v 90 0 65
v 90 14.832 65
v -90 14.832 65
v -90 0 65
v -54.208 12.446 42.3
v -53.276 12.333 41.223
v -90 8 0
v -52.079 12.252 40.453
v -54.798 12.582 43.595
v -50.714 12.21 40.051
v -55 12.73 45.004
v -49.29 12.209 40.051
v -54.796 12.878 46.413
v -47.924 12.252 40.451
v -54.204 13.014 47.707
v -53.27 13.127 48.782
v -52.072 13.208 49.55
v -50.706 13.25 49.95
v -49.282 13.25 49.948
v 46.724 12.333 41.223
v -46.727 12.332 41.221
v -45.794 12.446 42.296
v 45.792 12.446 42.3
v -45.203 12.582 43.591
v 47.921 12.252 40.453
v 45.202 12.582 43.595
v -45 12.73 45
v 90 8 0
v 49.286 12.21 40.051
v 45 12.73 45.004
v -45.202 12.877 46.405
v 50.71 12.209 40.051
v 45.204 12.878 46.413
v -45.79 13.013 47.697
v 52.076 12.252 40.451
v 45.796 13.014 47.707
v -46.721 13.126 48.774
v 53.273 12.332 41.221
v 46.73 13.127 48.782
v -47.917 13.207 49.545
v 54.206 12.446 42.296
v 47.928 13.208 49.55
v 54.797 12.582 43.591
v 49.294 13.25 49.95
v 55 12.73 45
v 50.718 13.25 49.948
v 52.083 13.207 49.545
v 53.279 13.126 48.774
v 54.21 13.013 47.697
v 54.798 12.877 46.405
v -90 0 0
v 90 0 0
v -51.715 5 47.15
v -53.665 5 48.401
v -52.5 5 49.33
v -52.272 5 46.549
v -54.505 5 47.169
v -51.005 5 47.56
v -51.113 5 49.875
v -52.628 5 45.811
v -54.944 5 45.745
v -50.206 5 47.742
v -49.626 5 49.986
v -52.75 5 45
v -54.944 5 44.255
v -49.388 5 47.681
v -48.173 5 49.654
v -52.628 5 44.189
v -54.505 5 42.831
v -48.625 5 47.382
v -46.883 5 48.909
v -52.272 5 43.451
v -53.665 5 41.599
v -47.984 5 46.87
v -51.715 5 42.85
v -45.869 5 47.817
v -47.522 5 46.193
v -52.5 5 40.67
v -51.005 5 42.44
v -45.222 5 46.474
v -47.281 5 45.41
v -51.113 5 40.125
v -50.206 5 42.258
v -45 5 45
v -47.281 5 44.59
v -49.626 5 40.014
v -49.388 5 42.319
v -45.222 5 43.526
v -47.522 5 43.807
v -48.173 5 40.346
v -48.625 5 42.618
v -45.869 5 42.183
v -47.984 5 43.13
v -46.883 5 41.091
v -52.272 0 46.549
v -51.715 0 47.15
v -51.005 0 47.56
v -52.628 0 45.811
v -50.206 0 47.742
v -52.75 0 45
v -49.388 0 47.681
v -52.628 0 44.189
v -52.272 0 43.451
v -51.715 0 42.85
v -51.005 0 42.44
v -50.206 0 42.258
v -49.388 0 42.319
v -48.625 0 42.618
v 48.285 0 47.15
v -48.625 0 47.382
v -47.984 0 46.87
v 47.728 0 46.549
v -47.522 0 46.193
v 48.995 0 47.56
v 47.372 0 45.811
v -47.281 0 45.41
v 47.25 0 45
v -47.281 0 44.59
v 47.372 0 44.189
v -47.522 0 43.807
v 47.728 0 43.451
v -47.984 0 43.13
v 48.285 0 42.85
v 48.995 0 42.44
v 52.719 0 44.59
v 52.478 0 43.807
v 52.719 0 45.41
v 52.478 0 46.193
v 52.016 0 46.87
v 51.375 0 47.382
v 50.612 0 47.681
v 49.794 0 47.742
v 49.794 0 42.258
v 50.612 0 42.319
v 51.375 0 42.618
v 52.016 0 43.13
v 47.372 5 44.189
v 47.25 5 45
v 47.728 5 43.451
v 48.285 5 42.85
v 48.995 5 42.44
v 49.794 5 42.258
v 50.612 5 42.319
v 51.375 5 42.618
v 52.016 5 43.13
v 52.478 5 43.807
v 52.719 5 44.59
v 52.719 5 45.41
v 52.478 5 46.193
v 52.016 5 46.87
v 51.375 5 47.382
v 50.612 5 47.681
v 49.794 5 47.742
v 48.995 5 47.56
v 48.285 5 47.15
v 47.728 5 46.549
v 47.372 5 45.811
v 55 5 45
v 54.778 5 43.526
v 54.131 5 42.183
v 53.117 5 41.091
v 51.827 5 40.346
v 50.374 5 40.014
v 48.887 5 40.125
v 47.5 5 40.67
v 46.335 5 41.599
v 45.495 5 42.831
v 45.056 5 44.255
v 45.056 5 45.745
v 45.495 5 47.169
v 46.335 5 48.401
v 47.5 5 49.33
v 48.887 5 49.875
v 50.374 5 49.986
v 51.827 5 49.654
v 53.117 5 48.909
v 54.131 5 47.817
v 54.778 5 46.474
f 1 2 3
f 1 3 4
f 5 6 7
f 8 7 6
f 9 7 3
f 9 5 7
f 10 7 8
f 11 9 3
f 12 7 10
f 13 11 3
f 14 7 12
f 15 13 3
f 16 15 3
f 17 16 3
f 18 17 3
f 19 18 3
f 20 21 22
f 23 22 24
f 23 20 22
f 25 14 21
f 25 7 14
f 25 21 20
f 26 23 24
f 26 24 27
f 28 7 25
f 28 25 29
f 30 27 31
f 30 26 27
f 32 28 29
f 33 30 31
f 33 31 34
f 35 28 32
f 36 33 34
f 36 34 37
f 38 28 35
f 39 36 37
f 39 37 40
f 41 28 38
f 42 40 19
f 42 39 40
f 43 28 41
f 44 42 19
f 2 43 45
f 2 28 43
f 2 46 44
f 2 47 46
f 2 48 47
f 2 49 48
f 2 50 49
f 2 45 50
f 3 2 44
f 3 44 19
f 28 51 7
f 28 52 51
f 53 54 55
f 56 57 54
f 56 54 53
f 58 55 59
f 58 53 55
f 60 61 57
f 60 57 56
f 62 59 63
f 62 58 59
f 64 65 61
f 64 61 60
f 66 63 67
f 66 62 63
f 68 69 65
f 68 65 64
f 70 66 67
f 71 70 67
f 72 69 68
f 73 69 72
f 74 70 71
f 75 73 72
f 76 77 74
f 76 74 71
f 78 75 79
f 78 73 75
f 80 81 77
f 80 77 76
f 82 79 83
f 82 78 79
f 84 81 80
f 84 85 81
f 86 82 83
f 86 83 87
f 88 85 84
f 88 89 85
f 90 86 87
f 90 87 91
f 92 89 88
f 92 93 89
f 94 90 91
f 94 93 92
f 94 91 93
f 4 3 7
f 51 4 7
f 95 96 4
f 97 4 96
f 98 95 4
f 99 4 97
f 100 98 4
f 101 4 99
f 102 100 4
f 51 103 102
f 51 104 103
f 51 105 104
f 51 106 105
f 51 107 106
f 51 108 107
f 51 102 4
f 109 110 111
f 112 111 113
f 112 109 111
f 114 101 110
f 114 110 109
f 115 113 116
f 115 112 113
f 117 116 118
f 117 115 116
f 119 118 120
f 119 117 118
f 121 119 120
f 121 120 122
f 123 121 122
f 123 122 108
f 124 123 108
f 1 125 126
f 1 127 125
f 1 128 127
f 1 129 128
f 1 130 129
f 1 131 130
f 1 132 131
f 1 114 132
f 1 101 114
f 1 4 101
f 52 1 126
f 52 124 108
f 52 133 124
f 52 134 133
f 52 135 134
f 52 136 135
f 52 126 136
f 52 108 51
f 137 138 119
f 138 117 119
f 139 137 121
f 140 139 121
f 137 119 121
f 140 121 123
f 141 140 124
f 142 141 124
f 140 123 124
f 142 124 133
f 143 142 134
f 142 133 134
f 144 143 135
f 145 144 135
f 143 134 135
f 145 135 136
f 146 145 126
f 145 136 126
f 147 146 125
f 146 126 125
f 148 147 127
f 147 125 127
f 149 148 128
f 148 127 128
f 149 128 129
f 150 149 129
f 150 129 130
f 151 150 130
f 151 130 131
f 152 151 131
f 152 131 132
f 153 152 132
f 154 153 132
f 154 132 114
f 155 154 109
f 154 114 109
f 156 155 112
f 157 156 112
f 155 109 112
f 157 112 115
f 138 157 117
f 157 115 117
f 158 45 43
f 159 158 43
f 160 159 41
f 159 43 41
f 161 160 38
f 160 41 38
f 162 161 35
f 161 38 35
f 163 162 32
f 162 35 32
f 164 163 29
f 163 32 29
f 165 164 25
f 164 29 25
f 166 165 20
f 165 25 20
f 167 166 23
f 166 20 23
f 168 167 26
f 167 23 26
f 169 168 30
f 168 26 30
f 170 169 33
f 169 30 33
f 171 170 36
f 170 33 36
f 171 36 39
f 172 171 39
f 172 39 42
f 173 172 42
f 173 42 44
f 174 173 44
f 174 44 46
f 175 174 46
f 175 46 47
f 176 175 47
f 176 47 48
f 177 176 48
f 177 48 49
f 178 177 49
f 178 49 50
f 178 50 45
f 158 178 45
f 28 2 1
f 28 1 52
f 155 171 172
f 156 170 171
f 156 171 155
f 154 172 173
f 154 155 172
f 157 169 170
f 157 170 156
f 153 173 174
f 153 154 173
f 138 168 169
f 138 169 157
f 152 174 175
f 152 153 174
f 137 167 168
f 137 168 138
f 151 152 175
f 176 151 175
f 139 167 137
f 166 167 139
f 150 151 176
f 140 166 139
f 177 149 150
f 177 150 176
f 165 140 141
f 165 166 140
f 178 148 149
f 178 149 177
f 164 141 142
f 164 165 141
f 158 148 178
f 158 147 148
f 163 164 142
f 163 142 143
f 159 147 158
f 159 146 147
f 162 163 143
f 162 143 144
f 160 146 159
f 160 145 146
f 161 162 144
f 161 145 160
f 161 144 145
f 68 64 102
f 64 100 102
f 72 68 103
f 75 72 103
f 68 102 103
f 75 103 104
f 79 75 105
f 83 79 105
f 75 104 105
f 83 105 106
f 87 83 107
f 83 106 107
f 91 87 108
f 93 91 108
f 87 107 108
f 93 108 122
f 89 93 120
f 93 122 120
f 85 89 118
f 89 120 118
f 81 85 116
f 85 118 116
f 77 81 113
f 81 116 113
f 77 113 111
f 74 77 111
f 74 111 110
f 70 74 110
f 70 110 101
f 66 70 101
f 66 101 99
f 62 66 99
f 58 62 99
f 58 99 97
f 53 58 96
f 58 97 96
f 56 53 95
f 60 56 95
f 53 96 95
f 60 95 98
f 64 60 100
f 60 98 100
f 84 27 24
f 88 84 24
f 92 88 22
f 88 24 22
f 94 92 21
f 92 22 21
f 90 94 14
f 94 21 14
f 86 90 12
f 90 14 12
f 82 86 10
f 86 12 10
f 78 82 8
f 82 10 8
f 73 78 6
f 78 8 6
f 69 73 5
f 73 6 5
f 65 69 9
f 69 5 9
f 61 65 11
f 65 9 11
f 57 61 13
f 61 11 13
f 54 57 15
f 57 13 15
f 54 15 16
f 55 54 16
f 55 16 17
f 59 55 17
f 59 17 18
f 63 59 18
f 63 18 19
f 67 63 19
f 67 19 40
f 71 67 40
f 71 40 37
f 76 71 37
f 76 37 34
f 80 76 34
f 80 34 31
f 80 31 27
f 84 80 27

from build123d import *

# Parameters (mm, degrees)
BOSS_EXTRUDE1_DEPTH            = 90
CBORE_FOR_M5_SHCS1_D           = 5.5
CBORE_FOR_M5_SHCS1_CBORE_D     = 10
CBORE_FOR_M5_SHCS1_CBORE_DEPTH = 15


with BuildPart() as part:
    # Sketch2 → Boss-Extrude1 (new, symmetric)
    with BuildSketch(Plane(origin=(0, 0, 0), x_dir=(0, 0, -1), z_dir=(1, 0, 0))):
        Polygon((0, 0), (0, 8), (-65, 14.831775292), (-65, 0), align=None)
    extrude(amount=BOSS_EXTRUDE1_DEPTH, both=True)

    # CBORE for M5 SHCS1 (through all)
    with Locations(Plane(origin=(0, 20, -0.836227706), x_dir=(1, 0, 0), z_dir=(0, 1, 0))):
        with Locations((-50, -45.836227706), (50, -45.836227706)):
            CounterBoreHole(CBORE_FOR_M5_SHCS1_D / 2, CBORE_FOR_M5_SHCS1_CBORE_D / 2, CBORE_FOR_M5_SHCS1_CBORE_DEPTH)


solid = part.part
